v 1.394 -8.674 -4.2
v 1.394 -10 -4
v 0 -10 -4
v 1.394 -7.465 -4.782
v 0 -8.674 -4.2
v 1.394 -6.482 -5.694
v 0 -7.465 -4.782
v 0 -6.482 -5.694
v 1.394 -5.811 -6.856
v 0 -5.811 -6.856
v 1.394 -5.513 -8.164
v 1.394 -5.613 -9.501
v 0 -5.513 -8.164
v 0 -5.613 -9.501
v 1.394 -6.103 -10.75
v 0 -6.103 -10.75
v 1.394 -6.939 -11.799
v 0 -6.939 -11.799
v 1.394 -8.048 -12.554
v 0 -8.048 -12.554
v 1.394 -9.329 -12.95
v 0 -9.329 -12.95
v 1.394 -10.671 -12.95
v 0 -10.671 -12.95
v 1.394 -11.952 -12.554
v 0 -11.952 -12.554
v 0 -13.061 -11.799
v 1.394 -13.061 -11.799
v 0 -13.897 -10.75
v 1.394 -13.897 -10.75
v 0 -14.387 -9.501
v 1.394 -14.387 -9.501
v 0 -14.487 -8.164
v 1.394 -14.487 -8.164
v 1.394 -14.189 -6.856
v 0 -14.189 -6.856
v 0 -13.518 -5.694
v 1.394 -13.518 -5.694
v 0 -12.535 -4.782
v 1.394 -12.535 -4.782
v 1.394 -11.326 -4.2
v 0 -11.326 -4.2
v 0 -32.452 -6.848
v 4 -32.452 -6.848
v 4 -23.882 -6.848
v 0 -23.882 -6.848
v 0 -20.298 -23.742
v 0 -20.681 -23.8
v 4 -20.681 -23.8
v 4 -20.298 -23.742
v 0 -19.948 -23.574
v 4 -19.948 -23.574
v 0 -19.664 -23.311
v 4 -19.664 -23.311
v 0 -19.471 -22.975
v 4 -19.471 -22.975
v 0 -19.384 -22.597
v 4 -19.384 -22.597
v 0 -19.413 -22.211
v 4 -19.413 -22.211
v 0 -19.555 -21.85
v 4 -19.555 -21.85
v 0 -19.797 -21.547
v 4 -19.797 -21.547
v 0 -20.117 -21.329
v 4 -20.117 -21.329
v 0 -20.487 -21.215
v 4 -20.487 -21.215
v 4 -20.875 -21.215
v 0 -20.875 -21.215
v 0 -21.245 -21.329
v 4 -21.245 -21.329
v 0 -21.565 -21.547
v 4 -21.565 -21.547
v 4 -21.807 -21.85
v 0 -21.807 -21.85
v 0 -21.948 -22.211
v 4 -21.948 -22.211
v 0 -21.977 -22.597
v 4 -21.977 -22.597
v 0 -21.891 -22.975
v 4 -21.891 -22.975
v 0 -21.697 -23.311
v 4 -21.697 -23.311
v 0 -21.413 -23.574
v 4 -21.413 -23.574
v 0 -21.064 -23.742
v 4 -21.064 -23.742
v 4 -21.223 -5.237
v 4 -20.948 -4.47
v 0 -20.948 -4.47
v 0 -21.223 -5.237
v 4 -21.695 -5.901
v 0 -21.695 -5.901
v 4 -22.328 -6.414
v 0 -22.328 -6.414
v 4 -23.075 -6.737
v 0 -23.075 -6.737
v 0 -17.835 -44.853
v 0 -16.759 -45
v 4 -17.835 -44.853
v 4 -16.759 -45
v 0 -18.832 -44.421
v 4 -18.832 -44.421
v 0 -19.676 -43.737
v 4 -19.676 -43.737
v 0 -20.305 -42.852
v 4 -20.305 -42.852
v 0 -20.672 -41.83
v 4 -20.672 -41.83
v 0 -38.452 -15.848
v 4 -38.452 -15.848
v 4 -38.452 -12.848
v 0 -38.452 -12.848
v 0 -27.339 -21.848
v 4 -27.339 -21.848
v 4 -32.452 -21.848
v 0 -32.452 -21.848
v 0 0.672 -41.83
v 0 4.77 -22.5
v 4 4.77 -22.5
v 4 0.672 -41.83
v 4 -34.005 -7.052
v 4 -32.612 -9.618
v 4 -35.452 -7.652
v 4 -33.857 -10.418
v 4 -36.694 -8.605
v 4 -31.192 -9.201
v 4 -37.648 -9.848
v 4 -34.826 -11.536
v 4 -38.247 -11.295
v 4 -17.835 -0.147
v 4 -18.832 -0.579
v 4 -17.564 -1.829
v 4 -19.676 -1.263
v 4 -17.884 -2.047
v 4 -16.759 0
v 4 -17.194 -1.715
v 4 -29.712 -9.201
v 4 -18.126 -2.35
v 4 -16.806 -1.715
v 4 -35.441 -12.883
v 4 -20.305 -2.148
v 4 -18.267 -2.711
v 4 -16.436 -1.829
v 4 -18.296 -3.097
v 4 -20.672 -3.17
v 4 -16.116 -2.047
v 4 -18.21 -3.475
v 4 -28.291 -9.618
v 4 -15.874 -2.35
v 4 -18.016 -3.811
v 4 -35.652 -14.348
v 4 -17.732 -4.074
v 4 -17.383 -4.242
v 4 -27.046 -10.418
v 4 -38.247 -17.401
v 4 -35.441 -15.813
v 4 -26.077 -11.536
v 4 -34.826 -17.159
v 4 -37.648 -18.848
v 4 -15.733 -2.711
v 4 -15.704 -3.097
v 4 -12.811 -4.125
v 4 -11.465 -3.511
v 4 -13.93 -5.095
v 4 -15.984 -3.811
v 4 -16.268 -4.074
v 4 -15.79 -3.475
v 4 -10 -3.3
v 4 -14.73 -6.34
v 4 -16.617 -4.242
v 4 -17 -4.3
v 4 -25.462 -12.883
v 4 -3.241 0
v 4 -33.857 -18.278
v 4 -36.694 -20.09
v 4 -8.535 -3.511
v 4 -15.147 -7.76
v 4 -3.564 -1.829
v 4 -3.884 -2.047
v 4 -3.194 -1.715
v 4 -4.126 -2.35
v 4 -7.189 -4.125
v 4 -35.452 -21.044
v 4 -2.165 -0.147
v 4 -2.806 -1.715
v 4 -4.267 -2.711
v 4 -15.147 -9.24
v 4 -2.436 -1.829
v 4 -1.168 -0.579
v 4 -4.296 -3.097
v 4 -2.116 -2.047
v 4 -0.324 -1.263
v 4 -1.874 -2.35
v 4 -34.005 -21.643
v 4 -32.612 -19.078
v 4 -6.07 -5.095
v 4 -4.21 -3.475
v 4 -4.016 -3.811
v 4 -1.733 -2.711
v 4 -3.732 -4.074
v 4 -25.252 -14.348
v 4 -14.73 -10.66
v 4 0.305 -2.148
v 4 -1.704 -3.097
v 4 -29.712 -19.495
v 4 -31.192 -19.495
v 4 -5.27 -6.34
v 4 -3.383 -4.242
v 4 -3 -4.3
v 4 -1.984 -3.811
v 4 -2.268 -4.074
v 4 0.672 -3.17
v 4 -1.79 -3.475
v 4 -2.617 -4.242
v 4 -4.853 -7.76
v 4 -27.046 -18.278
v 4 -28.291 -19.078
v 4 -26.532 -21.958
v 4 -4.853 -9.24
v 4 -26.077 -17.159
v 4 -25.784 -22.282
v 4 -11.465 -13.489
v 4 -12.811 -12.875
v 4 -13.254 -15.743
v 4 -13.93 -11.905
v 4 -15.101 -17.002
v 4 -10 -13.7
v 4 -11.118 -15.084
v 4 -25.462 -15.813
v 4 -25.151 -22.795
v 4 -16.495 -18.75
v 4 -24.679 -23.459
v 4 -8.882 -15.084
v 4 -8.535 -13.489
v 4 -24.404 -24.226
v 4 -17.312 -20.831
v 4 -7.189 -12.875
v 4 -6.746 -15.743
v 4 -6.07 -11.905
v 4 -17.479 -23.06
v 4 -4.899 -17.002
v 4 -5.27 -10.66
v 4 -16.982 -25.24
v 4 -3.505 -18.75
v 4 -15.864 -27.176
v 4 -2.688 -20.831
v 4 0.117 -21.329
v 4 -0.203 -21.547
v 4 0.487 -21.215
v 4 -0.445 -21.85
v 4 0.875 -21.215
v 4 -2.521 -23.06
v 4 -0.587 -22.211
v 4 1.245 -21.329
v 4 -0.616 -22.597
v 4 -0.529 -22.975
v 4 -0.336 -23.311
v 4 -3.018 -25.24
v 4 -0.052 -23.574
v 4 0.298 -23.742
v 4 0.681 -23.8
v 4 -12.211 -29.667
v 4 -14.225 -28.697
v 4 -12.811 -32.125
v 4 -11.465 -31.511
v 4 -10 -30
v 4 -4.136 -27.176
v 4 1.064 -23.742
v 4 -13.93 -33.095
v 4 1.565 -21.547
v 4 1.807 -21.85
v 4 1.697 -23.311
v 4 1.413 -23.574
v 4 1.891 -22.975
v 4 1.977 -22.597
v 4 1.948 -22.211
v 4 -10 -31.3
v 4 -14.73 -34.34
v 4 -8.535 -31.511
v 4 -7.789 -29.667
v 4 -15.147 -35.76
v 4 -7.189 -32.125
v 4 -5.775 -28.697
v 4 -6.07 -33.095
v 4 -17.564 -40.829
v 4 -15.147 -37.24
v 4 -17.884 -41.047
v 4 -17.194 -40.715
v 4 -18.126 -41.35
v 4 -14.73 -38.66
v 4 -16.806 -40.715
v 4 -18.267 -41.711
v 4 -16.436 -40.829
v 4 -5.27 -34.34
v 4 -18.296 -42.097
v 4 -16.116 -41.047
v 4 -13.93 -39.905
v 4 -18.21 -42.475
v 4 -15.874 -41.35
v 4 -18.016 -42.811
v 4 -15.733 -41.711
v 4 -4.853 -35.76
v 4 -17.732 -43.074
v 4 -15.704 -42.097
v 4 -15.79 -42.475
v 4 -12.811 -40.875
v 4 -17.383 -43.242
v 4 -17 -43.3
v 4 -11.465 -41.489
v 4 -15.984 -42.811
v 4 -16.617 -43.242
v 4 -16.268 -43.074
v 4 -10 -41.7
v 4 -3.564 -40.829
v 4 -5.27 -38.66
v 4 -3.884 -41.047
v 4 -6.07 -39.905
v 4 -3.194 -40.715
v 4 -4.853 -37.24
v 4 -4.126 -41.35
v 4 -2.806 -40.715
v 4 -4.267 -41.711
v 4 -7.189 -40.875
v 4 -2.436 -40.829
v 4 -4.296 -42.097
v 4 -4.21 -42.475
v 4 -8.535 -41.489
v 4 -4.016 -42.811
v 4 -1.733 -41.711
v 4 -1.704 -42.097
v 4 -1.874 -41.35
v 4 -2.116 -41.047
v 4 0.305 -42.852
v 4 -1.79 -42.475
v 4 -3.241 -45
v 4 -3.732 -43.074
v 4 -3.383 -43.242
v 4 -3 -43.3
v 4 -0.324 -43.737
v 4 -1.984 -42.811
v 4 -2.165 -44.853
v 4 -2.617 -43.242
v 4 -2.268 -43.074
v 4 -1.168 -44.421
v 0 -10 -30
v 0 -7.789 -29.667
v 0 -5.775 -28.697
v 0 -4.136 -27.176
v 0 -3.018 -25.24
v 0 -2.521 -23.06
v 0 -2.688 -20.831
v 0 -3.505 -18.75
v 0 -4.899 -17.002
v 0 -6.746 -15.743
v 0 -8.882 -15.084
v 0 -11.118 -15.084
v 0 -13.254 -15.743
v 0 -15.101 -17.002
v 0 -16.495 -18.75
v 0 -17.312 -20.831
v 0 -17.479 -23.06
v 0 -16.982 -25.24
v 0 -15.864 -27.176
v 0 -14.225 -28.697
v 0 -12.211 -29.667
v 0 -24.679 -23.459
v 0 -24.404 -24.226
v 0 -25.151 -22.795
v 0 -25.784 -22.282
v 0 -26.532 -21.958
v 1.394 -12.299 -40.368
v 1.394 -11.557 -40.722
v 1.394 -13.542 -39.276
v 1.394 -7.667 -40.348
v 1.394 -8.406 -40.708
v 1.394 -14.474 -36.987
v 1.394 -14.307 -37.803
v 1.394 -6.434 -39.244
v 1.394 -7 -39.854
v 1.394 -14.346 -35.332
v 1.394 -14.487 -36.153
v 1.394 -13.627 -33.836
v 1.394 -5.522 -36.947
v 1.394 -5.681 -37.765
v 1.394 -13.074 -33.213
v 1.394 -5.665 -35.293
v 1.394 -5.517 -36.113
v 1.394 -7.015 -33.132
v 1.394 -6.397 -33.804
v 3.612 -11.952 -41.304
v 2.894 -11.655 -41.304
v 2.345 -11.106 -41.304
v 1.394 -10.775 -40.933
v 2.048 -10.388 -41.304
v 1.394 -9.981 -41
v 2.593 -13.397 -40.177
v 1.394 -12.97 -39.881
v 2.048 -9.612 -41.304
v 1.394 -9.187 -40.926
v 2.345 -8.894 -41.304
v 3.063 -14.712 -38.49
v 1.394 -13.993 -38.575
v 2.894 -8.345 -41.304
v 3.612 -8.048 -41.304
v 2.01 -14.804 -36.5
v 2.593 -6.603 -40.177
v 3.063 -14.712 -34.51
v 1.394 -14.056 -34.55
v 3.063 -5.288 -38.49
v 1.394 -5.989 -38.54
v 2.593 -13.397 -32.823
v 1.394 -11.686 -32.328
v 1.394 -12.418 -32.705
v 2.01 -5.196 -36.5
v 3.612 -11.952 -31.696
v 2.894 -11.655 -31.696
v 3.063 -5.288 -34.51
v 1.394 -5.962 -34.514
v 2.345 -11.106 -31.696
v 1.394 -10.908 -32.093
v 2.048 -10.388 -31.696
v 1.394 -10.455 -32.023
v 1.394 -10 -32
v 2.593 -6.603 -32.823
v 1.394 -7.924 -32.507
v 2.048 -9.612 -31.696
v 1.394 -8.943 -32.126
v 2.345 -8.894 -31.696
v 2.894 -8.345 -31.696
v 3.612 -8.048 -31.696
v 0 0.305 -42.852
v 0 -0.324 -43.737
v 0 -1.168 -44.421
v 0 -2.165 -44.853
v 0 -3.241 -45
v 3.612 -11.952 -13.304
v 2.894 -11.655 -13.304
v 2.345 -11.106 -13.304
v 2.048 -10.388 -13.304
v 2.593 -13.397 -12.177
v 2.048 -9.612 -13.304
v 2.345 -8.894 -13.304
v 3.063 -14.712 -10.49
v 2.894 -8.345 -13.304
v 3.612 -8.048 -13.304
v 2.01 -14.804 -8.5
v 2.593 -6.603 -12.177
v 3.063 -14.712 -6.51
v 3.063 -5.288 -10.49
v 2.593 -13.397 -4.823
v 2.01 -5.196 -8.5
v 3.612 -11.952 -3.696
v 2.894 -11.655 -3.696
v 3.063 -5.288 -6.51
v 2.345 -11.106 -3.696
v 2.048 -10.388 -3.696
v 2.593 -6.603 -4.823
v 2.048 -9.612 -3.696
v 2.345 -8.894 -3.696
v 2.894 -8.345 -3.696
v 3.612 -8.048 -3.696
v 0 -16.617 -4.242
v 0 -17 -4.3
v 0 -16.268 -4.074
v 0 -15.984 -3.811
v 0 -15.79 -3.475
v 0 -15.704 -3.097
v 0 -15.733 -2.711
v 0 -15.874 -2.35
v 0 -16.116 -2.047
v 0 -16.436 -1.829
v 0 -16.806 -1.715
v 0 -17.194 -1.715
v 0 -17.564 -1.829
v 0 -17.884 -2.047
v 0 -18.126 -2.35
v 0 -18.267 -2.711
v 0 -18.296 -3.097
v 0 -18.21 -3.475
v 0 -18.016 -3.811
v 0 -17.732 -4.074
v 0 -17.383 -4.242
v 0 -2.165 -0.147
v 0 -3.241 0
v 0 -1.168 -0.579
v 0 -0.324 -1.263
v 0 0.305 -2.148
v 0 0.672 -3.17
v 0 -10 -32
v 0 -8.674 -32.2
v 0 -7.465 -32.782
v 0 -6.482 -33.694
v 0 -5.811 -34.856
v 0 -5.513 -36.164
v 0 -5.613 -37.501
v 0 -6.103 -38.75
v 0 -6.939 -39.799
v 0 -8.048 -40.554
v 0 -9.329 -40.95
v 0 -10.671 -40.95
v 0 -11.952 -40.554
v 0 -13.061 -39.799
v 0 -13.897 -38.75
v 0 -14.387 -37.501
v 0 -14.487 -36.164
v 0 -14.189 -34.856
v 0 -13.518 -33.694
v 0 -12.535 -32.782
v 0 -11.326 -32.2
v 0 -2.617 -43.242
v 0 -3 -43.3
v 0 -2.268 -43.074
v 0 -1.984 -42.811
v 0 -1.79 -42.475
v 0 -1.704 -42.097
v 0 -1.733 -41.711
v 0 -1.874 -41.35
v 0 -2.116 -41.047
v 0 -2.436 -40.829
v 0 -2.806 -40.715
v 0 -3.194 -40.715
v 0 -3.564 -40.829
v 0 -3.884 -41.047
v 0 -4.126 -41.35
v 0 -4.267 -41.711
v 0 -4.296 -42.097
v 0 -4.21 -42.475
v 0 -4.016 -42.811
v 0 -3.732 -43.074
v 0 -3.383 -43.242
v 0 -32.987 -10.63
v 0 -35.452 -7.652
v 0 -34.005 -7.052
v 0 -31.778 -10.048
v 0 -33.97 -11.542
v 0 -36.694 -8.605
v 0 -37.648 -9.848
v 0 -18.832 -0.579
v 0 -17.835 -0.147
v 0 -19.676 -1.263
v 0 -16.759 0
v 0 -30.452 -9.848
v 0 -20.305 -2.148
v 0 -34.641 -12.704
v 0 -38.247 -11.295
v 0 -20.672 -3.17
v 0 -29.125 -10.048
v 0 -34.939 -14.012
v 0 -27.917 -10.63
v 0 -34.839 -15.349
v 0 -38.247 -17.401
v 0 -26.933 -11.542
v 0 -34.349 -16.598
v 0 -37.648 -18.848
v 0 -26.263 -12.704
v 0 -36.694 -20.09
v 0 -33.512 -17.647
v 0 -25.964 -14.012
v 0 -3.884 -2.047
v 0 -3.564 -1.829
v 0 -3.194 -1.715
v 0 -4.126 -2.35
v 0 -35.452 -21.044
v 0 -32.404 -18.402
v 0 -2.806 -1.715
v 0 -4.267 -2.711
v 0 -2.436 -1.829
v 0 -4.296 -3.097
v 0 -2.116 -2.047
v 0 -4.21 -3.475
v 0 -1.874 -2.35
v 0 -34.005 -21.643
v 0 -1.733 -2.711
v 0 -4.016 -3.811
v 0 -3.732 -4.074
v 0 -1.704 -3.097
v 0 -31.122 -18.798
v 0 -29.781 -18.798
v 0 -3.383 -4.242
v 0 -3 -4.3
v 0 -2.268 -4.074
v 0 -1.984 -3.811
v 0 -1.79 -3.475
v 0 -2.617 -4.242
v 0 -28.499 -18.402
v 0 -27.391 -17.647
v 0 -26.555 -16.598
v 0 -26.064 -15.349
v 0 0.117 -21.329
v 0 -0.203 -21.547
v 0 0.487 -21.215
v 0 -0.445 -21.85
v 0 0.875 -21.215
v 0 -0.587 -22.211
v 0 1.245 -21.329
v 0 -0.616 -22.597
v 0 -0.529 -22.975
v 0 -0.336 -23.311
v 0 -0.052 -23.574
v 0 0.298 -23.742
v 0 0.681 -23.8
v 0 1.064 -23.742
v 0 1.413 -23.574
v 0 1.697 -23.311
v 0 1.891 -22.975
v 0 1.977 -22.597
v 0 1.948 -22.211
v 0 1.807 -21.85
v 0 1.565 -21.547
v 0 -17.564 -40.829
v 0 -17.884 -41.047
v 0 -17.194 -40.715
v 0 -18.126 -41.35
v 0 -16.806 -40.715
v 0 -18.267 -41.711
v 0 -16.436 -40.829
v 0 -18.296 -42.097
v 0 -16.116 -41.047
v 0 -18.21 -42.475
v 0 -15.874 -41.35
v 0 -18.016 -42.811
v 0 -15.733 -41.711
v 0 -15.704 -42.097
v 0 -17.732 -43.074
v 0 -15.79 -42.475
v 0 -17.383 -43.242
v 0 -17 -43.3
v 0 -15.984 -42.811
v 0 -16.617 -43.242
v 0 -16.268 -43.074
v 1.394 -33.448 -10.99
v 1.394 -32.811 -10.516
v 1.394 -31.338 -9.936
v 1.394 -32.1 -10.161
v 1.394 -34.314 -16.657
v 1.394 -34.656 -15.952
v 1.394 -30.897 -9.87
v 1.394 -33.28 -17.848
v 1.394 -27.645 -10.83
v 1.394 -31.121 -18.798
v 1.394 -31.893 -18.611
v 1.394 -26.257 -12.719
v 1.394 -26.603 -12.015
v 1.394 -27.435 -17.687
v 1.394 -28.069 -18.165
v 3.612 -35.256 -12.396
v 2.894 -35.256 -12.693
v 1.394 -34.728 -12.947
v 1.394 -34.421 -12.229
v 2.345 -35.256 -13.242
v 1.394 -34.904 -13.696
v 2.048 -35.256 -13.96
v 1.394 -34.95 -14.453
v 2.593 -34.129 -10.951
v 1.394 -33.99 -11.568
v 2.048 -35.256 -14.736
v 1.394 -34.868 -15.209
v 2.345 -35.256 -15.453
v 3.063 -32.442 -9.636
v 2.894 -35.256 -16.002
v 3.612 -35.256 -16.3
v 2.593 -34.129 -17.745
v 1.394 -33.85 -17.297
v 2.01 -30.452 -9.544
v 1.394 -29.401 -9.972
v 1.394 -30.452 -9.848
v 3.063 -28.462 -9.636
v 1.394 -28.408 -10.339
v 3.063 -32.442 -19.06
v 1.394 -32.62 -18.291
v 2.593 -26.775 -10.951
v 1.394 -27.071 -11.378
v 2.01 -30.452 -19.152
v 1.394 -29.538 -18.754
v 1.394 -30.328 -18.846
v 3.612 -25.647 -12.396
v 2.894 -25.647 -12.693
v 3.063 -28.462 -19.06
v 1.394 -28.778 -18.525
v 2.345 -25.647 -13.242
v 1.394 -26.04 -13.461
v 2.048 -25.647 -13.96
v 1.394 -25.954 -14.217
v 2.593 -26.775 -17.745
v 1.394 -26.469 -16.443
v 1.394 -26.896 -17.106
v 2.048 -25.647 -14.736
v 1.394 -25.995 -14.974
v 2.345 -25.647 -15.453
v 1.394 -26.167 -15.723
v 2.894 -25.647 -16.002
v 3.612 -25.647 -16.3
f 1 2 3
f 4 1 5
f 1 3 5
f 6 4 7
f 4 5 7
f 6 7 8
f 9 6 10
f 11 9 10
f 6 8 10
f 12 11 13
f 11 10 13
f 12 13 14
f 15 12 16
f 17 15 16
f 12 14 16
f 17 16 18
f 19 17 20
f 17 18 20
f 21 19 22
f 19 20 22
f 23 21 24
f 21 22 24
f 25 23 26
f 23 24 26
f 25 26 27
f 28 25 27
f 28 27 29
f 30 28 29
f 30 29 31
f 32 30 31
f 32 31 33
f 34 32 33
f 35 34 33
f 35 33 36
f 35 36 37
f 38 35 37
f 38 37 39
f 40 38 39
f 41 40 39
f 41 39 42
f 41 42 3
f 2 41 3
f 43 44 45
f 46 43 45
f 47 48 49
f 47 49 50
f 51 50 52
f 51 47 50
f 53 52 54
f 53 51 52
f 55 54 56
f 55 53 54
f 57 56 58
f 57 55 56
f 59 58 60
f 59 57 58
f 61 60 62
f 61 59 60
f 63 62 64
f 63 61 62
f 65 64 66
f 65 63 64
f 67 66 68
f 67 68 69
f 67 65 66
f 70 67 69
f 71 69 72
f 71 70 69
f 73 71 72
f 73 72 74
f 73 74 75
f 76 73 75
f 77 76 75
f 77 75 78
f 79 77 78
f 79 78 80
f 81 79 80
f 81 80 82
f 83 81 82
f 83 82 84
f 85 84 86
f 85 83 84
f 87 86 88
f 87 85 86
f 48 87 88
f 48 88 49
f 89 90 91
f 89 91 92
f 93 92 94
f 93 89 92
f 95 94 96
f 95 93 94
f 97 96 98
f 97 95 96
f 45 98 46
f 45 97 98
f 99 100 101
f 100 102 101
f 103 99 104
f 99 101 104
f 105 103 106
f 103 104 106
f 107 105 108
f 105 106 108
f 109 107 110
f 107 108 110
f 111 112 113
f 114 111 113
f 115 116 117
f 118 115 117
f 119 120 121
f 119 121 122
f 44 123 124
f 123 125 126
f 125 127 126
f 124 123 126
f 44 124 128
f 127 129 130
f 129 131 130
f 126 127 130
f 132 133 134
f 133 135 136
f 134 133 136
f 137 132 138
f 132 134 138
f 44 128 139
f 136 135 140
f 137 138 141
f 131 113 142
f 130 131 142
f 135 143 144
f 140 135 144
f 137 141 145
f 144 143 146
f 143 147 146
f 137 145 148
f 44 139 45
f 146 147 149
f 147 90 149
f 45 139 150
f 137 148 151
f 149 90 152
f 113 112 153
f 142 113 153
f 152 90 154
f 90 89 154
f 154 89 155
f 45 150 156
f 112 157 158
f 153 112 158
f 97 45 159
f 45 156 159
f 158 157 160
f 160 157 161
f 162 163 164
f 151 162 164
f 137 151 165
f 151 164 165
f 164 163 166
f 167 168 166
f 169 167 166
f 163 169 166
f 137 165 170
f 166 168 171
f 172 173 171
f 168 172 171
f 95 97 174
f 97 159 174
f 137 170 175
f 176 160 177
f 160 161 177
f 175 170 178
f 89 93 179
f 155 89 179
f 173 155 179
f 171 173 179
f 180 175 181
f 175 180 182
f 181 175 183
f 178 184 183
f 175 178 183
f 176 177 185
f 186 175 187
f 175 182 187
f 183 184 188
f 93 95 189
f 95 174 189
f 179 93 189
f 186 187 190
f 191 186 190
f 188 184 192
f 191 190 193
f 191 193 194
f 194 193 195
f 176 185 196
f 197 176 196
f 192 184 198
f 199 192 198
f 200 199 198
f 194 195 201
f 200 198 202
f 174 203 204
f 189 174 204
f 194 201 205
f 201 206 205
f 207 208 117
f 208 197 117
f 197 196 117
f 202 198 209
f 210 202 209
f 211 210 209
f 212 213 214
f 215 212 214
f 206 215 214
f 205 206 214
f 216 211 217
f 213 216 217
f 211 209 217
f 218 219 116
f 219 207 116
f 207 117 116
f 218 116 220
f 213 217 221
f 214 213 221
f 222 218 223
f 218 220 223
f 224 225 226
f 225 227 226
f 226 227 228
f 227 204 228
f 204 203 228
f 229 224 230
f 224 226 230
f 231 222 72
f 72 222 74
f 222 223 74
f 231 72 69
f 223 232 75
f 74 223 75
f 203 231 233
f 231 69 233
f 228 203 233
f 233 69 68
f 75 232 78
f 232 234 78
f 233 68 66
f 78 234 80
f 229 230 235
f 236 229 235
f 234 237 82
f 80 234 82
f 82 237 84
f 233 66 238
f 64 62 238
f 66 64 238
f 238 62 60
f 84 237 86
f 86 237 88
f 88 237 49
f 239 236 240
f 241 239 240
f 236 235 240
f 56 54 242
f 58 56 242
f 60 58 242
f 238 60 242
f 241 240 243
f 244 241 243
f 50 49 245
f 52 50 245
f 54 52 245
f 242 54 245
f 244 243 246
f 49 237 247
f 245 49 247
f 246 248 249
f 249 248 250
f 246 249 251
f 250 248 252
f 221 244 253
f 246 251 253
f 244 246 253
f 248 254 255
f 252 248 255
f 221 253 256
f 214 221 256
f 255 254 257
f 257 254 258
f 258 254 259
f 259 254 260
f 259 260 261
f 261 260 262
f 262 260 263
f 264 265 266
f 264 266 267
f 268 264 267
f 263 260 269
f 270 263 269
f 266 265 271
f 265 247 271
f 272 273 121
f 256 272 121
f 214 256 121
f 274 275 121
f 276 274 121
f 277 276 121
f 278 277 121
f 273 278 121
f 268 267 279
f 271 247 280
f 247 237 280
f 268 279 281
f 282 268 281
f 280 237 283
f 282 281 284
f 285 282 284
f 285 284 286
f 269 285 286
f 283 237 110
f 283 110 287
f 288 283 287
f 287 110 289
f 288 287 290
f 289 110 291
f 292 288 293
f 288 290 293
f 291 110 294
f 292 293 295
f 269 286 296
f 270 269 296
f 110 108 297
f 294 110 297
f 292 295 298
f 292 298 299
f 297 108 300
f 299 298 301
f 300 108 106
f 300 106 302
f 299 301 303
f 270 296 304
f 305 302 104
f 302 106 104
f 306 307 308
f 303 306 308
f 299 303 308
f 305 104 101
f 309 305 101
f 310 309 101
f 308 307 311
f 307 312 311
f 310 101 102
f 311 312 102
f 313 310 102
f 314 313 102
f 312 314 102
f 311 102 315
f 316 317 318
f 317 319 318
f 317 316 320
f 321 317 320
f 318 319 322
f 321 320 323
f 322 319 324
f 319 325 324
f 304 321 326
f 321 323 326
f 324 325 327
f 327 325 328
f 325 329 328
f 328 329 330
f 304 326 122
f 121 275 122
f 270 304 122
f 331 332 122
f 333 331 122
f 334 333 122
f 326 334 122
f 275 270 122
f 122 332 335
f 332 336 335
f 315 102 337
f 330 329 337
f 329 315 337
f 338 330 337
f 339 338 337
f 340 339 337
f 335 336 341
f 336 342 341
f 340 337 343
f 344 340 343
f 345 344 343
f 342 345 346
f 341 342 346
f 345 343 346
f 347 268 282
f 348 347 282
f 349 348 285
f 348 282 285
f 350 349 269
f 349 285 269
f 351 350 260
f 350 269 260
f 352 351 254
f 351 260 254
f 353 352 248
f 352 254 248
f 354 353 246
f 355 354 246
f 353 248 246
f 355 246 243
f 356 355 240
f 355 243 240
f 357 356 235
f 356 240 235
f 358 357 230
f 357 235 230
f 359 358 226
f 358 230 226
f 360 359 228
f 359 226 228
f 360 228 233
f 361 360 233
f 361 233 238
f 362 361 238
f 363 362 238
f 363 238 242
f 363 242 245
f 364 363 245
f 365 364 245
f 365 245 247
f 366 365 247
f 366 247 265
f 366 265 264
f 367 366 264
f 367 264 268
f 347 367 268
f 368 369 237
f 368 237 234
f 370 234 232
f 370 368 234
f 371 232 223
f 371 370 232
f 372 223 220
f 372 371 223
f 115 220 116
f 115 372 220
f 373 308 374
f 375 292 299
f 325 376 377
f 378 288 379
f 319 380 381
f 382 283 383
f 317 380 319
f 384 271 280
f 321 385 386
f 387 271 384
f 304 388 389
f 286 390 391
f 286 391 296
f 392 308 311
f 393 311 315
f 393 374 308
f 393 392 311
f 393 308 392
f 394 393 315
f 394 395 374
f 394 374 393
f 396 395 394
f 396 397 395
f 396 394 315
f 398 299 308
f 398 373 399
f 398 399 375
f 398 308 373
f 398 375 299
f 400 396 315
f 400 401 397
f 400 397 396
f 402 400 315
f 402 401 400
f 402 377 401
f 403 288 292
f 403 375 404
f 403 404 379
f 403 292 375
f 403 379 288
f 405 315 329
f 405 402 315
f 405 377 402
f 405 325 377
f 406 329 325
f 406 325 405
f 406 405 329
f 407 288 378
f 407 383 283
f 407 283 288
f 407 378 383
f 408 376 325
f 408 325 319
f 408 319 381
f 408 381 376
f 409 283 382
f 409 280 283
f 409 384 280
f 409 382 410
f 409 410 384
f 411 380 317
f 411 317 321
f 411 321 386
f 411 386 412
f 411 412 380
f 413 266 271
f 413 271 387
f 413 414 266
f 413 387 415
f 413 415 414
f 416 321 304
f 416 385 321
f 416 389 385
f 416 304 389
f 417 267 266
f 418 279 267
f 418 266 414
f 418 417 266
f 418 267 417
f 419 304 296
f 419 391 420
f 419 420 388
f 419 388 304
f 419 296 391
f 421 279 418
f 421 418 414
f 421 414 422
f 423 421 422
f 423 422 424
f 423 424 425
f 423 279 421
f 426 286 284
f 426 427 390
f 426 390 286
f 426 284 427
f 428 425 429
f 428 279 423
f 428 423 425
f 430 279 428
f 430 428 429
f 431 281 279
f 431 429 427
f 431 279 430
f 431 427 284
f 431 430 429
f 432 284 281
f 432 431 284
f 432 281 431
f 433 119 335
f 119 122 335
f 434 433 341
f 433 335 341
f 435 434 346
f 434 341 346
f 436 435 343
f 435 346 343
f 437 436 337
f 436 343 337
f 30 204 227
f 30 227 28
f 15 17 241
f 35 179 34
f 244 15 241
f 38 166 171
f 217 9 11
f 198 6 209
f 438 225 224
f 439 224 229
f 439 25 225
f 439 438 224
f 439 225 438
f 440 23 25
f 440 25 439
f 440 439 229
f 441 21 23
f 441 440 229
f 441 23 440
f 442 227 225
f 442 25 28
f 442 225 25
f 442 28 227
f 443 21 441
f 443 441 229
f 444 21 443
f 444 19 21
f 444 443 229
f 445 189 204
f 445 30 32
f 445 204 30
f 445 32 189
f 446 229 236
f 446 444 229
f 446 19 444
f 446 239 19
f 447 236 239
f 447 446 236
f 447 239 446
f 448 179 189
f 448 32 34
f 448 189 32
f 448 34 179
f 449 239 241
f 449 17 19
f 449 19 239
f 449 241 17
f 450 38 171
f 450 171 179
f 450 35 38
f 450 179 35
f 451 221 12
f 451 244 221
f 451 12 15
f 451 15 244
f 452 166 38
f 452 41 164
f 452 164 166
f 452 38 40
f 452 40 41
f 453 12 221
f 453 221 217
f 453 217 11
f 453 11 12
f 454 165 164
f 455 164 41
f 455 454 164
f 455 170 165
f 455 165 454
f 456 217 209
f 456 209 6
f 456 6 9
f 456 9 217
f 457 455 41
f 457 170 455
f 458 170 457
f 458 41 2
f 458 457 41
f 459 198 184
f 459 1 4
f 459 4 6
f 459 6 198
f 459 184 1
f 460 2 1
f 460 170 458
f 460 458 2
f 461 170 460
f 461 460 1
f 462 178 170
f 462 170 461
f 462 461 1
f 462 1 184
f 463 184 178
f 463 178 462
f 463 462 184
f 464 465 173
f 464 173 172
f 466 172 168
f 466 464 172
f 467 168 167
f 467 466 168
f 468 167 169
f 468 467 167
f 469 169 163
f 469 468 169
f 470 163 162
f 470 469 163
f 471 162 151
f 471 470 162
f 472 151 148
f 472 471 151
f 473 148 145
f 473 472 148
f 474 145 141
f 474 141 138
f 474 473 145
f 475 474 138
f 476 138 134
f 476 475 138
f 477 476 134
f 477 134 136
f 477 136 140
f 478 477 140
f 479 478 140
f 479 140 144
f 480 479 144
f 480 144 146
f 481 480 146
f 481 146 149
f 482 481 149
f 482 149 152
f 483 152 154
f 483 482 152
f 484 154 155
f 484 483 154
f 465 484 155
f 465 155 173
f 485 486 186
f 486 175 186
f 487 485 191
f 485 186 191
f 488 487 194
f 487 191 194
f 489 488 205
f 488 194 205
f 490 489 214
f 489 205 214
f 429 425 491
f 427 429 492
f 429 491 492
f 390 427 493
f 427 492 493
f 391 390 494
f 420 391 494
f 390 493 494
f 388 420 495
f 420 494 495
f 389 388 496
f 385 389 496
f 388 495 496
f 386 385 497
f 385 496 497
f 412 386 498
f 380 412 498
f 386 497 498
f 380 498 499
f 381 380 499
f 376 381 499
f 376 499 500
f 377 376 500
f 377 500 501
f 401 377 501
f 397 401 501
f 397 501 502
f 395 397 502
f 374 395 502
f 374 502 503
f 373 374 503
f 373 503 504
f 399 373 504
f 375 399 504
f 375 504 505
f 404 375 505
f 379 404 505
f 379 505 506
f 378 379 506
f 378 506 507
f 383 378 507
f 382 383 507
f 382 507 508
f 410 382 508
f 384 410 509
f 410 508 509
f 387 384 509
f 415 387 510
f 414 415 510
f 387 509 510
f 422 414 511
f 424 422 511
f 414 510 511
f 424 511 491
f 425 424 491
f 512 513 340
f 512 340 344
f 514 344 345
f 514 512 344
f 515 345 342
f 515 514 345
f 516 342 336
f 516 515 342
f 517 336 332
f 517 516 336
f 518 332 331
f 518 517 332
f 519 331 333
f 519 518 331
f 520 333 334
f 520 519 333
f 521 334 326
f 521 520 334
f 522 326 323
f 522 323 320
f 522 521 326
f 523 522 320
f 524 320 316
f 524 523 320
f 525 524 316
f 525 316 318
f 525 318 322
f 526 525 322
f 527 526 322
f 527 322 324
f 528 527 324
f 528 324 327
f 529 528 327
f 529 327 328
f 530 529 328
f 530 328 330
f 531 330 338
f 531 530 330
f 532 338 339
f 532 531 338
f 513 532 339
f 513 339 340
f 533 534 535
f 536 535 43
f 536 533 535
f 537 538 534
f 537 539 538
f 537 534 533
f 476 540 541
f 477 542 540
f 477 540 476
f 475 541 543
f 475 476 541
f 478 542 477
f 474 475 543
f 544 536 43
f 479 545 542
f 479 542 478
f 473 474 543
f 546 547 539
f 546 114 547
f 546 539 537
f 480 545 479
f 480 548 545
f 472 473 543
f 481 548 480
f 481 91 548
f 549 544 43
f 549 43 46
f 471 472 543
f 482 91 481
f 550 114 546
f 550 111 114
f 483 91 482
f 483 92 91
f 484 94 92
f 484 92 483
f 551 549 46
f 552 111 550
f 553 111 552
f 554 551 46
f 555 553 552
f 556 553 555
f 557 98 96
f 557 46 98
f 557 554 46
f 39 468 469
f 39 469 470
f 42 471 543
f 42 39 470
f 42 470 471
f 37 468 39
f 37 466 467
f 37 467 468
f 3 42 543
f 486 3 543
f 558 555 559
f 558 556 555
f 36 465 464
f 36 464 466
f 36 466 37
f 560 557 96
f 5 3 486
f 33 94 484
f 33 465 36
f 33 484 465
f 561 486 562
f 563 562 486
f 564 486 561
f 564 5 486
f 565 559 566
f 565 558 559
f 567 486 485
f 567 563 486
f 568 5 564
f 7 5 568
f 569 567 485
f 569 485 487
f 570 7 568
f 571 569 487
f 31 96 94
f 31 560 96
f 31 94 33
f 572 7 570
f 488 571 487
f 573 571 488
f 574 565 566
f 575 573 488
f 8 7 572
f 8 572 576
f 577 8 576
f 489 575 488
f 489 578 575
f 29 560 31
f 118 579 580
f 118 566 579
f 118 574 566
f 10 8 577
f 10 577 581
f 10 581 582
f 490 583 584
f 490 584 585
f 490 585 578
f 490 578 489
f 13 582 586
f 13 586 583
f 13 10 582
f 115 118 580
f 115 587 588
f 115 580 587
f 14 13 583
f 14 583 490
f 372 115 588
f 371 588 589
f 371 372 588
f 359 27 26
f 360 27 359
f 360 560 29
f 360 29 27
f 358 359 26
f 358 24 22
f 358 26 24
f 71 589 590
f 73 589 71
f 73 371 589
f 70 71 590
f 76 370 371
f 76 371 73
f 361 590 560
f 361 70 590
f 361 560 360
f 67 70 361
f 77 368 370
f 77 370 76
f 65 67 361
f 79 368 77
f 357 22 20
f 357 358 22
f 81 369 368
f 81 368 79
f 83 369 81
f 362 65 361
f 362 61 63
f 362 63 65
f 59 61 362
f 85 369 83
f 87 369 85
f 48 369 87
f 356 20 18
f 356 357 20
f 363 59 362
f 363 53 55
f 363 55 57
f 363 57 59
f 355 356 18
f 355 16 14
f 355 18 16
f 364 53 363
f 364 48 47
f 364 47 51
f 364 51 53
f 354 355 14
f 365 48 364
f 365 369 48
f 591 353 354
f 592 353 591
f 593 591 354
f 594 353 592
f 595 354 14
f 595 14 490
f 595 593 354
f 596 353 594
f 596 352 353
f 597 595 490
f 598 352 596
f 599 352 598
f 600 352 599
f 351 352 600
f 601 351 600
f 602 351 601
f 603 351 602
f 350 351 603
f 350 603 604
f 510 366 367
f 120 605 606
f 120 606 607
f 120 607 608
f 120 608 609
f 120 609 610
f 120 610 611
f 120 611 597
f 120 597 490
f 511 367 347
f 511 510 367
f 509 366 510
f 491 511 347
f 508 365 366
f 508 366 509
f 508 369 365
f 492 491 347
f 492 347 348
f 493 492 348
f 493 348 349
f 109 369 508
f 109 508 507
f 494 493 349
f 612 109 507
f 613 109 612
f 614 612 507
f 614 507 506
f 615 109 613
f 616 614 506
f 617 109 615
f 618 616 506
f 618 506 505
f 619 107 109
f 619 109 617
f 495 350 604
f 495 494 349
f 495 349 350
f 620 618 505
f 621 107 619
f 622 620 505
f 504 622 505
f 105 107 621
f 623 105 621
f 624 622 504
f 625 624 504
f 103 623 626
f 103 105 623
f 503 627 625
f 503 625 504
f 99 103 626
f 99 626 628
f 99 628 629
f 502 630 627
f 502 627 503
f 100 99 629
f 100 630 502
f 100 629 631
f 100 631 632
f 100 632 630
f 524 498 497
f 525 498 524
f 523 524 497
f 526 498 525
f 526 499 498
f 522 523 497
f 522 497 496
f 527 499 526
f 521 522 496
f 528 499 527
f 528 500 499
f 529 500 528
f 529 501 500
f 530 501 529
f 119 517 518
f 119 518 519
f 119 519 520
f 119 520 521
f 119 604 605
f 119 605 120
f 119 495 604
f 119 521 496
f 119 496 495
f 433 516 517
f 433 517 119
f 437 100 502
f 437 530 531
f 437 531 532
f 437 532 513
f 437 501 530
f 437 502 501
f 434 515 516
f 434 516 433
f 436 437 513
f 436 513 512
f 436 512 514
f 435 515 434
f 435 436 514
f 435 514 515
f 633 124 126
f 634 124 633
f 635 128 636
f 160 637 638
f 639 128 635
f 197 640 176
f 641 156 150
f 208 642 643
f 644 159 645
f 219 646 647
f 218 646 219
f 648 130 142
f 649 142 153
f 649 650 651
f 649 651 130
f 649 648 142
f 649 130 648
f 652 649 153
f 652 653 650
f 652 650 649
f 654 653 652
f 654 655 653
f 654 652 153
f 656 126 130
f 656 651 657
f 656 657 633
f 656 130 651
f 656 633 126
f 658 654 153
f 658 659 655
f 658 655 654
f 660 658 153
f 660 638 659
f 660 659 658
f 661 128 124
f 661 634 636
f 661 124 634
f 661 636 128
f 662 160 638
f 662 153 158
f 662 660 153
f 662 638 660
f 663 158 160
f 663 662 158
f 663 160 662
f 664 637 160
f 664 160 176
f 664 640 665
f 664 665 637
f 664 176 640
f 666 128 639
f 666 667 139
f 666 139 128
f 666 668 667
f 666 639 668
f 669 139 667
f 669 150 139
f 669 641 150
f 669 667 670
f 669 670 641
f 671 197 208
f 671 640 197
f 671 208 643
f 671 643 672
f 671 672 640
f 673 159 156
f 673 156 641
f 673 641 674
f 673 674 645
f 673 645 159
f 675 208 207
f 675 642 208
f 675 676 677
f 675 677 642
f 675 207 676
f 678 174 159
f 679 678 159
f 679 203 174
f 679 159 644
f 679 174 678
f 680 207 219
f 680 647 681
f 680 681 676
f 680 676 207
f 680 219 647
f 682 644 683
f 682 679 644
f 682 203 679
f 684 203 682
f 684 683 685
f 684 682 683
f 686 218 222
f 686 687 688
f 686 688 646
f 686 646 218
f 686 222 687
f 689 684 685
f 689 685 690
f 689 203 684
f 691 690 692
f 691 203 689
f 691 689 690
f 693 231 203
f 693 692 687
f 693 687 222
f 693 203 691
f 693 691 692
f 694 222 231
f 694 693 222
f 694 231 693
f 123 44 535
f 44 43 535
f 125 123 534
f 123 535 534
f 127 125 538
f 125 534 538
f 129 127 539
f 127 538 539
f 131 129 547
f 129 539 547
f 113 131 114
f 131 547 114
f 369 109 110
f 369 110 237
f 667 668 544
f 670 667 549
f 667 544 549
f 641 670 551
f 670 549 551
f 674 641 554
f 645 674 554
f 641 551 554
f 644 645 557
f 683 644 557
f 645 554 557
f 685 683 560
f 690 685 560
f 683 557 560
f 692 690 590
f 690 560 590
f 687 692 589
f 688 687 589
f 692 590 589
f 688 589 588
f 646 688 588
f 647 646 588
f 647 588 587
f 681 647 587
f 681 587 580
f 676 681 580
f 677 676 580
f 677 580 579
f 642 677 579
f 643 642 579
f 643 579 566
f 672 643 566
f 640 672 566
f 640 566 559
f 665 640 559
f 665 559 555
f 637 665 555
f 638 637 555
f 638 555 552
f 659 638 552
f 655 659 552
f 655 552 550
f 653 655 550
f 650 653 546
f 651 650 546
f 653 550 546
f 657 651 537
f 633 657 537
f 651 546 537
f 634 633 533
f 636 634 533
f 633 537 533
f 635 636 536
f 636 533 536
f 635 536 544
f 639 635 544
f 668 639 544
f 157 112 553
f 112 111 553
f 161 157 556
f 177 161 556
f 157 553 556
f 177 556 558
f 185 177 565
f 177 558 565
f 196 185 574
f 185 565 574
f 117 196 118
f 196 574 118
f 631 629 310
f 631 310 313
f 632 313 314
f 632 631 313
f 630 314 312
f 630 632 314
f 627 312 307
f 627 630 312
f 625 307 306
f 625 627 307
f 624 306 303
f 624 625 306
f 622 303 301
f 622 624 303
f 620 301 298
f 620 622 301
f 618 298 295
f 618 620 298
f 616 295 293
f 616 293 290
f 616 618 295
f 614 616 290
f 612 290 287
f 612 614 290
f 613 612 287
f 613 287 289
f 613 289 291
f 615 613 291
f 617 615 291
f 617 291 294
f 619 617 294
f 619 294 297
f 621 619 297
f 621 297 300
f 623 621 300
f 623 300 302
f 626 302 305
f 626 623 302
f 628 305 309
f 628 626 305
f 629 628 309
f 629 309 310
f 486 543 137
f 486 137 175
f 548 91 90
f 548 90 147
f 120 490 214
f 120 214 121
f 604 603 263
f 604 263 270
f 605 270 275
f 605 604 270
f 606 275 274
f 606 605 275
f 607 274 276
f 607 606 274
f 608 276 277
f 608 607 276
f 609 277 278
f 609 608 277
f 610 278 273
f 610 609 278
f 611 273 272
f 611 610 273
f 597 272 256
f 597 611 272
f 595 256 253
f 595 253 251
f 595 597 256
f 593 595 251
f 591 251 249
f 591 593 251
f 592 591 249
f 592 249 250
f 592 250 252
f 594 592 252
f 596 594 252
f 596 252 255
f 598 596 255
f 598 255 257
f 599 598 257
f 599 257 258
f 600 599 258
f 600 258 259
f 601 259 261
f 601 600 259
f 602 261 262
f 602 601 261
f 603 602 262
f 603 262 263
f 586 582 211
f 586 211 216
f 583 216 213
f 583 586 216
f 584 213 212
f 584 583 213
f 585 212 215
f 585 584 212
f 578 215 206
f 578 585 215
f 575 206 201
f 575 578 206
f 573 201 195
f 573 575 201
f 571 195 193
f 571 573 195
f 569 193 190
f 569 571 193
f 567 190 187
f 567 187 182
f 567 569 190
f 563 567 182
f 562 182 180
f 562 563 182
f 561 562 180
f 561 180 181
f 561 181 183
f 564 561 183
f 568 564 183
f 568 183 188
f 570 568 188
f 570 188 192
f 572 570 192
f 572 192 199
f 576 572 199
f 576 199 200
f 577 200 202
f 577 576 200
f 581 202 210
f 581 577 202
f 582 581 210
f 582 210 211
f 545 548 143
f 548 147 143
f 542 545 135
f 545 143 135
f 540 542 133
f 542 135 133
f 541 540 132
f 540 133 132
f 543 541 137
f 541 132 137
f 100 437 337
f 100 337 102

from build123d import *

# Parameters (mm, degrees)
SKETCH1_R           = 1.3
BOSS_EXTRUDE1_DEPTH = 4
SKETCH3_R           = 7.5
CUT_EXTRUDE1_DEPTH  = 52.522207254
SKETCH4_R           = 4.5
CUT_EXTRUDE2_DEPTH  = 52.522207254
BOSS_EXTRUDE2_DEPTH = 4
SKETCH7_R           = 4.5
CUT_EXTRUDE3_DEPTH  = 60.325619484
FILLET1_R           = 6
FILLET2_R           = 4
FILLET3_R           = 3
FILLET4_R           = 3


with BuildPart() as part:
    # Sketch1 → Boss-Extrude1 (new body)
    with BuildSketch(Plane(origin=(0, 0, 0), x_dir=(0, 0, -1), z_dir=(1, 0, 0))):
        Polygon((0, 0), (22.5, 4.769696007), (45, 0), (45, -20), (22.5, -24.769696007), (0, -20), align=None)
        with Locations((22.5, 0.680807118)):
            Circle(SKETCH1_R, mode=Mode.SUBTRACT)
        with Locations((22.5, -20.680807118)):
            Circle(SKETCH1_R, mode=Mode.SUBTRACT)
        with Locations((3, -3)):
            Circle(SKETCH1_R, mode=Mode.SUBTRACT)
        with Locations((42, -3)):
            Circle(SKETCH1_R, mode=Mode.SUBTRACT)
        with Locations((42, -17)):
            Circle(SKETCH1_R, mode=Mode.SUBTRACT)
        with Locations((3, -17)):
            Circle(SKETCH1_R, mode=Mode.SUBTRACT)
    extrude(amount=BOSS_EXTRUDE1_DEPTH)

    # Sketch2 → Cut-Revolve1 (revolve, cut)
    with BuildSketch(Plane(origin=(4, 0, 0), x_dir=(0, 0, -1), z_dir=(1, 0, 0))):
        with BuildLine():
            Line((3.3, -10), (13.7, -10))
            ThreePointArc((13.7, -10), (8.5, -4.8), (3.3, -10))
        make_face()
        with BuildLine():
            Line((31.3, -10), (41.7, -10))
            ThreePointArc((41.7, -10), (36.5, -4.8), (31.3, -10))
        make_face()
    revolve(axis=Axis((4, -10, -3.3), (0, 0, -1)), mode=Mode.SUBTRACT)

    # Sketch3 → Cut-Extrude1 (cut, through all)
    with BuildSketch(Plane(origin=(4, 0, 0), x_dir=(0, 0, -1), z_dir=(1, 0, 0))):
        with Locations((22.5, -10)):
            Circle(SKETCH3_R)
    extrude(amount=-CUT_EXTRUDE1_DEPTH, mode=Mode.SUBTRACT)

    # Sketch4 → Cut-Extrude2 (cut, through all)
    with BuildSketch(Plane.ZY):
        with Locations((-8.5, -10)):
            Circle(SKETCH4_R)
        with Locations((-36.5, -10)):
            Circle(SKETCH4_R)
    extrude(amount=-CUT_EXTRUDE2_DEPTH, mode=Mode.SUBTRACT)

    # Sketch5 → Boss-Extrude2 (add)
    with BuildSketch(Plane(origin=(4, 0, 0), x_dir=(0, 0, -1), z_dir=(1, 0, 0))):
        Polygon((6.847826087, -21.451646611), (21.847826087, -24.631443949), (21.847826087, -38.451646611), (6.847826087, -38.451646611), align=None)
    extrude(amount=-BOSS_EXTRUDE2_DEPTH)

    # Sketch6 → Cut-Revolve2 (revolve, cut)
    with BuildSketch(Plane(origin=(4, 0, 0), x_dir=(0, 0, -1), z_dir=(1, 0, 0))):
        with BuildLine():
            Line((14.347826087, -25.251646611), (14.347826087, -35.651646611))
            ThreePointArc((14.347826087, -35.651646611), (9.147826087, -30.451646611), (14.347826087, -25.251646611))
        make_face()
    revolve(axis=Axis((4, -25.251646611, -14.347826087), (0, -1, 0)), mode=Mode.SUBTRACT)

    # Sketch7 → Cut-Extrude3 (cut, through all)
    with BuildSketch(Plane.ZY):
        with Locations((-14.347826087, -30.451646611)):
            Circle(SKETCH7_R)
    extrude(amount=-CUT_EXTRUDE3_DEPTH, mode=Mode.SUBTRACT)

    # Fillet1
    fillet1_edges = [part.edges().sort_by_distance(p)[0] for p in [
        (2, -38.451646611, -6.847826087),
        (2, -38.451646611, -21.847826087),
    ]]
    fillet(fillet1_edges, radius=FILLET1_R)

    # Fillet2
    fillet2_edges = [part.edges().sort_by_distance(p)[0] for p in [
        (2, -20, 0),
        (2, 0, 0),
        (2, 0, -45),
        (2, -20, -45),
    ]]
    fillet(fillet2_edges, radius=FILLET2_R)

    # Fillet3
    # the kernel refuses this fillet: 3 mm, written as the material it adds along each edge
    with BuildSketch(Plane(origin=(4, -21.451646611, -6.847826087), x_dir=(0, 0.20737808726455337, 0.9782608695652173), z_dir=(-1, 0, 0))) as fillet3_piece_1:
        with BuildLine():
            CenterArc((FILLET3_R * 0.810235733018, -FILLET3_R), FILLET3_R, 90, 78.031254445)
            Line((-FILLET3_R * 0.168025136547, -FILLET3_R * 0.792621912735), (-FILLET3_R * 0.187590353938, -FILLET3_R * 0.78847435099))
            Line((-FILLET3_R * 0.187590353938, -FILLET3_R * 0.78847435099), (-FILLET3_R * 0.0162047146604, FILLET3_R * 0.02))
            Line((-FILLET3_R * 0.0162047146604, FILLET3_R * 0.02), (FILLET3_R * 0.810235733018, FILLET3_R * 0.02))
            Line((FILLET3_R * 0.810235733018, FILLET3_R * 0.02), (FILLET3_R * 0.810235733018, 0))
        make_face()
    extrude(amount=4)
    with BuildSketch(Plane(origin=(4, -24.631443949, -21.847826087), x_dir=(0, -1, 0), z_dir=(-1, 0, 0))) as fillet3_piece_2:
        with BuildLine():
            CenterArc((2.005793936, -3), FILLET3_R, 90, 38.499950409)
            Line((0.138252058, -0.652173913), (0.100901221, -0.605217391))
            ThreePointArc((0.100901221, -0.605217391), (0.010430377, -0.338529642), (-0.058695652, -0.012442685))
            Line((-0.058695652, -0.012442685), (0, 0.06))
            Line((0, 0.06), (2.005793936, 0.06))
            Line((2.005793936, 0.06), (2.005793936, 0))
        make_face()
    extrude(amount=4)

    # Fillet4
    # the kernel refuses this fillet: 3 mm, written as the material it adds along each edge
    with BuildSketch(Plane(origin=(0, -24.769696007, -22.5), x_dir=(0, -0.9692541852770001, 0.24606162708357948), z_dir=(1, 0, 0))) as fillet4_piece_1:
        with BuildLine():
            CenterArc((1.912264605, 2.907762556), FILLET4_R, 206.213326816, 78.031254445)
            Line((-0.779202353, 1.582618935), (-1.048349049, 1.450104573))
            Line((-1.048349049, 1.450104573), (-0.269146696, -0.132514362))
            Line((-0.269146696, -0.132514362), (-0.123241287, -0.273517065))
            ThreePointArc((-0.123241287, -0.273517065), (2.044416244, -0.463368157), (2.724267974, -0.290776256))
            Line((2.724267974, -0.290776256), (2.650449486, 0))
        make_face()
    extrude(amount=4)


solid = part.part
